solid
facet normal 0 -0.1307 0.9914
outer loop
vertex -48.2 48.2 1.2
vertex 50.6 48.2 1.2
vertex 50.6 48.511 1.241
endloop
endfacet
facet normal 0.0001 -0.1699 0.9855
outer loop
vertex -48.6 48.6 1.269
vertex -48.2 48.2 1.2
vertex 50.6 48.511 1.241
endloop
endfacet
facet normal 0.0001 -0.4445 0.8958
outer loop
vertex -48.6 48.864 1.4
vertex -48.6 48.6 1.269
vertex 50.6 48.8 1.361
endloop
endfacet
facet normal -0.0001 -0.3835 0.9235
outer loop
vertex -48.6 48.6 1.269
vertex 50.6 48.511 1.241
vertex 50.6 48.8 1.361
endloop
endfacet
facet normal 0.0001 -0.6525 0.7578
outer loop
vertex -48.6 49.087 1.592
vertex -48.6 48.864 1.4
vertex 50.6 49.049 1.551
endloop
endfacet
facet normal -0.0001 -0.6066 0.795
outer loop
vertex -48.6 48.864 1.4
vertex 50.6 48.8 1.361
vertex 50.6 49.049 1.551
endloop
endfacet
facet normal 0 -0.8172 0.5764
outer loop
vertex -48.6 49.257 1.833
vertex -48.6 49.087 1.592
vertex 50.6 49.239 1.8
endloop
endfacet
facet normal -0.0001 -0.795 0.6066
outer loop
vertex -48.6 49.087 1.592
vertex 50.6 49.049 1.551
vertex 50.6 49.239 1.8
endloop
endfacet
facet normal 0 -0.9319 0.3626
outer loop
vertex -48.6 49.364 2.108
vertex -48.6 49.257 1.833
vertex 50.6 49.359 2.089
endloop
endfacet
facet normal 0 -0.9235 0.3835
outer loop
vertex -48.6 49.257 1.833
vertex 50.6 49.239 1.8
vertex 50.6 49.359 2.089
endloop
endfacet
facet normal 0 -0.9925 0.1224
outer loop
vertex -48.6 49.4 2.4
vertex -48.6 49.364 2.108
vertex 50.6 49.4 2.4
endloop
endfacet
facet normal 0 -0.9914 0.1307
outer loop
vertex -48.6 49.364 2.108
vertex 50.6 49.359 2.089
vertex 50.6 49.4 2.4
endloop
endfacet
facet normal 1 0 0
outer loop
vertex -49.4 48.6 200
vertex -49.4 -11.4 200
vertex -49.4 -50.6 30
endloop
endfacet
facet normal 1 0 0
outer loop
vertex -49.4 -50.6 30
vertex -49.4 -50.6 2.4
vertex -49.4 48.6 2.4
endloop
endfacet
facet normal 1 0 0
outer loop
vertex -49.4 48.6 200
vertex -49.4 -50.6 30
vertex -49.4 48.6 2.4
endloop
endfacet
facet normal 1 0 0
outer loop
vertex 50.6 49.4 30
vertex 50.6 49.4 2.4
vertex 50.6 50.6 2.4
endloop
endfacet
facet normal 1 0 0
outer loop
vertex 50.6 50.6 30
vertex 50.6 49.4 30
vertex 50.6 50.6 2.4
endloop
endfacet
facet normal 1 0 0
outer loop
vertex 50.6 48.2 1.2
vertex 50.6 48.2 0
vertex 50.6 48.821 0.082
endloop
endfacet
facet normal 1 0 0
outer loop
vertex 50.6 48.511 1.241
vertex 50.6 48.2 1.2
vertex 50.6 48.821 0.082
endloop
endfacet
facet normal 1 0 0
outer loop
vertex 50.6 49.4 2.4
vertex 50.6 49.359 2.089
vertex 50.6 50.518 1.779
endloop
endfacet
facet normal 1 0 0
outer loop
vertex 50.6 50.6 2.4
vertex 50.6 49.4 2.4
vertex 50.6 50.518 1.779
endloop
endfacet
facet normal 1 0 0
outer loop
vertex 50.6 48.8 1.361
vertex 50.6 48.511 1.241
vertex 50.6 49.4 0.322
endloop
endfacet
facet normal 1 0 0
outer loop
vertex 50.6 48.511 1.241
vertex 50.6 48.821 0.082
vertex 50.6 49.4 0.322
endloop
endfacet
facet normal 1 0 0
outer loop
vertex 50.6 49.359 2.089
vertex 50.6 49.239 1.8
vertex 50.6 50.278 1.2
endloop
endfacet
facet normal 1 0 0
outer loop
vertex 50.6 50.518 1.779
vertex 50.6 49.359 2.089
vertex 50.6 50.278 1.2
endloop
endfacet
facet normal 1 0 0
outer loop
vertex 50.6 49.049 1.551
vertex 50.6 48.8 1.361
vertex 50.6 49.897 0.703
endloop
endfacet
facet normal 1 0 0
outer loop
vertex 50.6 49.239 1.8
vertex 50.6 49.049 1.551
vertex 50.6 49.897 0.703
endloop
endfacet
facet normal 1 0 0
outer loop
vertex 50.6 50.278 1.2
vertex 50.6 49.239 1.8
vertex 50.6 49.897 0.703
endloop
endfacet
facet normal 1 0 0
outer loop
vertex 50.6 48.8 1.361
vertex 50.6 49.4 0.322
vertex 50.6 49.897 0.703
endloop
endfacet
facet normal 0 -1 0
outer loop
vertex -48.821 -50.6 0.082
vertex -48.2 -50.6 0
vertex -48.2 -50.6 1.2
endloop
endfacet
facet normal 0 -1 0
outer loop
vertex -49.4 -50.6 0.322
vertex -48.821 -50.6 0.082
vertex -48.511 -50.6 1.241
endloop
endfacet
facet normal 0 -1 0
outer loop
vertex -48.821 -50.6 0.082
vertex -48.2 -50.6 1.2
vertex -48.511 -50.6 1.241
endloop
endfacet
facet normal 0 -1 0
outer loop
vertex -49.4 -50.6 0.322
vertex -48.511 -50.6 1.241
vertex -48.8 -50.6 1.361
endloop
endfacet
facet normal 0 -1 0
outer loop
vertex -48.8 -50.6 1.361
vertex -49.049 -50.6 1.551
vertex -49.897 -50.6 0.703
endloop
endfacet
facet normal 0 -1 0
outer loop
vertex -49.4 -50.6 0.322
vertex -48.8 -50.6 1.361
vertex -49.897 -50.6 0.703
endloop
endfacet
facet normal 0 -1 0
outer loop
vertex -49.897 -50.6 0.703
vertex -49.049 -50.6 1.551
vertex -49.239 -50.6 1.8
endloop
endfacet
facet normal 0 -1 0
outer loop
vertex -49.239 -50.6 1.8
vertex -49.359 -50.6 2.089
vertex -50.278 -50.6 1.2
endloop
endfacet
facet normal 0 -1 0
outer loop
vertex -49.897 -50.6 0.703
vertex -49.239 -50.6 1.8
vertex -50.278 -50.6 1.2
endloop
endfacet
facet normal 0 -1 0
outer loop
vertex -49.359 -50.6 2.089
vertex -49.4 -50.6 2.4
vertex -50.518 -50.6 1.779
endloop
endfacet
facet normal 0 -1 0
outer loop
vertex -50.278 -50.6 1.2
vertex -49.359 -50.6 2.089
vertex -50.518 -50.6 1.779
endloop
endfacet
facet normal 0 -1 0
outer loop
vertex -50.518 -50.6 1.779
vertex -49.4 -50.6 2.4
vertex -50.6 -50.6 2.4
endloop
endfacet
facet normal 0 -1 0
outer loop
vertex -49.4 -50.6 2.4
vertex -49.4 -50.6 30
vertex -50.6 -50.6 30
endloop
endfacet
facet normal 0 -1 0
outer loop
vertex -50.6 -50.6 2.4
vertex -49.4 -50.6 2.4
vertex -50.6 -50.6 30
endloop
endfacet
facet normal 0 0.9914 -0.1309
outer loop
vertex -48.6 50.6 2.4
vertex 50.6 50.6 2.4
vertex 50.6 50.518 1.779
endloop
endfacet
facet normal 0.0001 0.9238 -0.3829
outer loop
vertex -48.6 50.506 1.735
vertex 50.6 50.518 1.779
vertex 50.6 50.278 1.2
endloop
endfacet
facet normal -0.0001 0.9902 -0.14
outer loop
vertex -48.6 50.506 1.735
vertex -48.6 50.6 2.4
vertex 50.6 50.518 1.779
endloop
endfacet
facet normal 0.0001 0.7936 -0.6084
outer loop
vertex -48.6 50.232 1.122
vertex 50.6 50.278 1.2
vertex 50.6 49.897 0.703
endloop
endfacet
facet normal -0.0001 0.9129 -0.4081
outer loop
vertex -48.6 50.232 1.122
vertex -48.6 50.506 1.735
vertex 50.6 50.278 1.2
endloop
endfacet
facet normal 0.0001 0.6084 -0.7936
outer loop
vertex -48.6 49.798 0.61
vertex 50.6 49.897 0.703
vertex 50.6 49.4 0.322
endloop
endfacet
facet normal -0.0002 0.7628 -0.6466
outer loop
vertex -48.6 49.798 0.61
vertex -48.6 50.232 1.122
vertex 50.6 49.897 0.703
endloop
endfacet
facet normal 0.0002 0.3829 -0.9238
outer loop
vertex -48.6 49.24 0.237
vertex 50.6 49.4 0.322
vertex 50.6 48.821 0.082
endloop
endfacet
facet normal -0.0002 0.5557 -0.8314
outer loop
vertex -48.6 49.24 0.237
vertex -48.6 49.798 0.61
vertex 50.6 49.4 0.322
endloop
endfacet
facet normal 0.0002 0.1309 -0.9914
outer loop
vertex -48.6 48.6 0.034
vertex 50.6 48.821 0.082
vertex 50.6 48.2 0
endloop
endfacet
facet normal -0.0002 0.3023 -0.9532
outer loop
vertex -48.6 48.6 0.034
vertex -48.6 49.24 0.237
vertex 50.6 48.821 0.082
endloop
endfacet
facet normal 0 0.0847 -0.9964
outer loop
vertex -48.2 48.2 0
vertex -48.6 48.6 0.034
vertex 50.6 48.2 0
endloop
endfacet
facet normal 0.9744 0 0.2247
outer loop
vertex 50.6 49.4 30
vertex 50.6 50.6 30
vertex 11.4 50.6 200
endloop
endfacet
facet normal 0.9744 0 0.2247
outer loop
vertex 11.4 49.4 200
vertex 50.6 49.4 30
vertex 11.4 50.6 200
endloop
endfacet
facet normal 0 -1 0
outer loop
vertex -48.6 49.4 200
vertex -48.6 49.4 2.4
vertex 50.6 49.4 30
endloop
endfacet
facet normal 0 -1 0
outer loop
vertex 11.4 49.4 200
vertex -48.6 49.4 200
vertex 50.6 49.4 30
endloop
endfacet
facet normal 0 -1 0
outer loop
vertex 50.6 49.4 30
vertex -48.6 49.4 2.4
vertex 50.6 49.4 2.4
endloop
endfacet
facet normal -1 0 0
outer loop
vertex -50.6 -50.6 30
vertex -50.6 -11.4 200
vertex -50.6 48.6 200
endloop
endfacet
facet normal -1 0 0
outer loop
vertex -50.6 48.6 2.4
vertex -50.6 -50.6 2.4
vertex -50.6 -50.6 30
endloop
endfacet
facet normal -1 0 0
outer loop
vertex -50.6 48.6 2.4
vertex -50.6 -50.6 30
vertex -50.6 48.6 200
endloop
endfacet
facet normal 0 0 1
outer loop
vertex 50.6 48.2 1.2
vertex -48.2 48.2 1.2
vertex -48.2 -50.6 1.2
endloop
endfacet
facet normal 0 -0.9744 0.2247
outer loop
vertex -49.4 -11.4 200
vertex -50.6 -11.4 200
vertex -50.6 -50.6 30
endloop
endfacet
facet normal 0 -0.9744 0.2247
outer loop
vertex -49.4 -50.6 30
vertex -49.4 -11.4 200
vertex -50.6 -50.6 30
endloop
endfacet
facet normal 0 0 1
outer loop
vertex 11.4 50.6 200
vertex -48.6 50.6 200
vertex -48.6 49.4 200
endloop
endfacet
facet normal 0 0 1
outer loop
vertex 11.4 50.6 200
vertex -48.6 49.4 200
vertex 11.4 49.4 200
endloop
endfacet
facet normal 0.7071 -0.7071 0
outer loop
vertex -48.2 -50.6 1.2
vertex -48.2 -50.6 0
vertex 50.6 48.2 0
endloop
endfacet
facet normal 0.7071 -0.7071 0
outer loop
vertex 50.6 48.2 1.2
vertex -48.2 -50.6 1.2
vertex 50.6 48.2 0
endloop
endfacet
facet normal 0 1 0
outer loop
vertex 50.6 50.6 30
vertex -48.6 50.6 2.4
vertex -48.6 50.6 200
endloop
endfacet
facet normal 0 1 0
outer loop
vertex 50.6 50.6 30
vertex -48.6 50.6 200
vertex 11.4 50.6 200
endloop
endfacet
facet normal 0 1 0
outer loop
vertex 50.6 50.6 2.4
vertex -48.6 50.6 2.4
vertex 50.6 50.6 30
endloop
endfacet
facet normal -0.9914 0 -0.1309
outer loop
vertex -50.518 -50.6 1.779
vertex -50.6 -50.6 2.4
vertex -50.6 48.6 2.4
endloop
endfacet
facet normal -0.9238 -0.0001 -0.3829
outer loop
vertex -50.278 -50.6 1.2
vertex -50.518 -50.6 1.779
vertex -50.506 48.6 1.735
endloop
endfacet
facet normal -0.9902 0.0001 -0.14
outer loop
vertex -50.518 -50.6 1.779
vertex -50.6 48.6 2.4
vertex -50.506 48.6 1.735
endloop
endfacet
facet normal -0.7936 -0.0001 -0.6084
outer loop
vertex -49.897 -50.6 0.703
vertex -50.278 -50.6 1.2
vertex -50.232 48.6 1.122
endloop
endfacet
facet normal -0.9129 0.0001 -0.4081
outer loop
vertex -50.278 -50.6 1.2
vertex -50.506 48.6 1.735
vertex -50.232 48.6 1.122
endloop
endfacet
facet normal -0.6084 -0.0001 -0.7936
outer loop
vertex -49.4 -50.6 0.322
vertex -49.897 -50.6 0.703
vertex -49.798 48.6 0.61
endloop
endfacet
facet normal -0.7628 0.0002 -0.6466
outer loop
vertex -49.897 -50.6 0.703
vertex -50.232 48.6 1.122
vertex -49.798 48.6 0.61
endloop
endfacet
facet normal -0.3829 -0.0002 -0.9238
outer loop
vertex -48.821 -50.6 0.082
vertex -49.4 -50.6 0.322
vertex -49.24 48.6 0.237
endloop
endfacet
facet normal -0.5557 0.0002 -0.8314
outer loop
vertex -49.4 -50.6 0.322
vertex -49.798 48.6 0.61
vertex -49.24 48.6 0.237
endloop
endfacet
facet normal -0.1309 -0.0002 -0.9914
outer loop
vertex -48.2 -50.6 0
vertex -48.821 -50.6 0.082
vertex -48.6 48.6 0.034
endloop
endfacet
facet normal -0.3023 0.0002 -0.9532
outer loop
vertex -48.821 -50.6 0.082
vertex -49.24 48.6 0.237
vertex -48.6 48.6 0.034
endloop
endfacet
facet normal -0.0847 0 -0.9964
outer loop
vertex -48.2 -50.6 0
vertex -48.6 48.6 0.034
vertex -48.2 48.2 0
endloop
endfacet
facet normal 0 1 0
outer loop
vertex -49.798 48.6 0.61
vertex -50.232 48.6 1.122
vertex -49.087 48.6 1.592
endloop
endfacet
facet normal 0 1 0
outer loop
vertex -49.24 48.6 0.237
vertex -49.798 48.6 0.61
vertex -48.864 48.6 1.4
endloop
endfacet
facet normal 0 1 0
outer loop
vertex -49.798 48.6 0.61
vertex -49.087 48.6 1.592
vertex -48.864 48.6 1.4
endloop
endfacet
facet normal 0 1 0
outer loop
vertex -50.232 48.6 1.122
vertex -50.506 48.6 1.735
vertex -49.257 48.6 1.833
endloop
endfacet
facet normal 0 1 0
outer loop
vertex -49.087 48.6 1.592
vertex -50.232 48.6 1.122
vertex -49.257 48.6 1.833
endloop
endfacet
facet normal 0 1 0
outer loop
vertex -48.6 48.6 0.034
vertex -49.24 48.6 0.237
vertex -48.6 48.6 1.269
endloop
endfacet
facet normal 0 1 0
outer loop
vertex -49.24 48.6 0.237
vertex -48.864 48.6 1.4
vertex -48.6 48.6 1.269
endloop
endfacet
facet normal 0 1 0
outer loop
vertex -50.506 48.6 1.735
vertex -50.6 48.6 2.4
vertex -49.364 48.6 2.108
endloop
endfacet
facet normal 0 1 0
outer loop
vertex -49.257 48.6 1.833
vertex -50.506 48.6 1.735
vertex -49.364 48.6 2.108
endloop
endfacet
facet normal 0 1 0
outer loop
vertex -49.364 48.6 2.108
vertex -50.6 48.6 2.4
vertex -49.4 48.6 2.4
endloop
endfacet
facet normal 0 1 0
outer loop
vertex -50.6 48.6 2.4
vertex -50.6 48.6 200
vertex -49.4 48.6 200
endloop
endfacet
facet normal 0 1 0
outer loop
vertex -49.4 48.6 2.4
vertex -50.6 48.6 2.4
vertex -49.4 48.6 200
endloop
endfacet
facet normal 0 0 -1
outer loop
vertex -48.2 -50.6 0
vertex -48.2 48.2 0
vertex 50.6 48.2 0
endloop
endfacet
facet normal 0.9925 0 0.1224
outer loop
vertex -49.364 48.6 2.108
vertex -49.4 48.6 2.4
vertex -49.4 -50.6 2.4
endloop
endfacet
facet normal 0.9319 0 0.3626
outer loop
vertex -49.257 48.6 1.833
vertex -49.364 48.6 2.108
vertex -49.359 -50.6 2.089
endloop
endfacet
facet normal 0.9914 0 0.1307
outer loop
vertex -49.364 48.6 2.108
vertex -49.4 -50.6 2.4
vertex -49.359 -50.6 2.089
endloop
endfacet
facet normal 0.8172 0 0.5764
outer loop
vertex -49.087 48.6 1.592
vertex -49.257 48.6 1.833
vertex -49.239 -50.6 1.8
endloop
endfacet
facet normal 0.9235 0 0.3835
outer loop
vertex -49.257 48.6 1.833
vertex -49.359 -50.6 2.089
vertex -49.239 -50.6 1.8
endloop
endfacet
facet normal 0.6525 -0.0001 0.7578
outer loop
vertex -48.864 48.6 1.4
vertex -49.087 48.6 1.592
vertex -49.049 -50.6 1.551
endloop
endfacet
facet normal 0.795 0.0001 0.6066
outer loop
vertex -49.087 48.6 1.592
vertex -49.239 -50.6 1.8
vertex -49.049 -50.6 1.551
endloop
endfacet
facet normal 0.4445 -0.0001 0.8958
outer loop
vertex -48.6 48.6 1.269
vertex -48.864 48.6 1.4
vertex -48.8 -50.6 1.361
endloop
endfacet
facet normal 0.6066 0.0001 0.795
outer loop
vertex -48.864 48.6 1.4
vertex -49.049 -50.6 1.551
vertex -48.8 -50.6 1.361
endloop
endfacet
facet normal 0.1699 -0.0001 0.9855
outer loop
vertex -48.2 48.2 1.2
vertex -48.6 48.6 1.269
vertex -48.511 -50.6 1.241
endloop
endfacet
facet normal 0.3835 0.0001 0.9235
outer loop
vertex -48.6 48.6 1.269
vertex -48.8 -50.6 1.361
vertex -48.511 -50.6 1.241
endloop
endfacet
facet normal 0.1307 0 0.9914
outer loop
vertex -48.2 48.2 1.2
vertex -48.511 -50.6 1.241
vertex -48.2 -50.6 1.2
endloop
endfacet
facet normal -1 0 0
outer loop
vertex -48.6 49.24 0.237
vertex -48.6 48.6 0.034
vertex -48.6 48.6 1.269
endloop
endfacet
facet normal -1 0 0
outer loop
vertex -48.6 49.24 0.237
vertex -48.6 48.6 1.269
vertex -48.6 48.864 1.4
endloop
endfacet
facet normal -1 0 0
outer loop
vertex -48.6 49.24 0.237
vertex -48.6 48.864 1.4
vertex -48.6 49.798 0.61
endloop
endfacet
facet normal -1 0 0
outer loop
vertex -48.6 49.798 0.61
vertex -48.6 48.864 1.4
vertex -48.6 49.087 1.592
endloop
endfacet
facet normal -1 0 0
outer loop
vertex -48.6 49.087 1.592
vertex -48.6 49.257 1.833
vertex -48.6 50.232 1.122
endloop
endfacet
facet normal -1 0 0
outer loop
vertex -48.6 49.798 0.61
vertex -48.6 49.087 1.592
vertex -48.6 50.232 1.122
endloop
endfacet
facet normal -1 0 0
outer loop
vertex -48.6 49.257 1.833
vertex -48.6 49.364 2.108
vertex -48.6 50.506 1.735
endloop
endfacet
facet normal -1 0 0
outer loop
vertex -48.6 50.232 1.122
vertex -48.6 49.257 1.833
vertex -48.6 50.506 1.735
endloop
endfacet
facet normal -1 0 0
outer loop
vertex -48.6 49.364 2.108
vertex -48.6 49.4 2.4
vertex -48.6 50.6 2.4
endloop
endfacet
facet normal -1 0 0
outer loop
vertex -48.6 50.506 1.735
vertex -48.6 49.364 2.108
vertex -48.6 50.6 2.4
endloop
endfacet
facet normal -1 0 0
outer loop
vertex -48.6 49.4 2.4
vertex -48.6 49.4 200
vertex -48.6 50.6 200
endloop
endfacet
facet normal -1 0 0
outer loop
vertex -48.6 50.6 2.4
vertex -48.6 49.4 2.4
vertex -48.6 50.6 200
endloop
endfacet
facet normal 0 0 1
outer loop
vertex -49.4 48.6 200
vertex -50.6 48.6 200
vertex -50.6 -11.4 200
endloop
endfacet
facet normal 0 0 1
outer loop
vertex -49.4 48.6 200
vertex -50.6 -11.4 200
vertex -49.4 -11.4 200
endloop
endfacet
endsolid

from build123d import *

# Parameters (mm, degrees)
F0_W        = 101.2
F0_H        = 101.2
F1_DEPTH    = 200
F2_T        = -1.2
F4_W        = 0.8
F4_H        = 0.8
F5_DEPTH    = 200.001
F6_R        = 1.2
F7_T4_DEPTH = 101.8
F8_R        = 2.4
F9_T1_DEPTH = 110.8
F12_DEPTH   = 25
F13_DEPTH   = 25
F15_DEPTH   = 25


# Not quite as in the source:
# - a fillet or chamfer that OpenCascade refuses, or shapes differently, is made with other operations: its cross-section is extruded or revolved along the edge and cut away or added


with BuildPart() as f1:
    # F0 (on Top) → F1 (new body)
    with BuildSketch(Plane.XY):
        Rectangle(F0_W, F0_H)
    extrude(amount=F1_DEPTH)

    # F2
    f2_openings = [f1.faces().sort_by_distance(p)[0] for p in [
        (0, 0, 200),
        (0, -50.6, 100),
        (50.6, 0, 100),
    ]]
    offset(amount=F2_T, openings=f2_openings)

    # F4 (on face) → F5 (cut, through all)
    with BuildSketch(Plane.XY.offset(200)):
        with Locations((-49, 49)):
            Rectangle(F4_W, F4_H)
        Polygon((-50.6, 50.6), (-50.6, 48.6), (-49.4, 48.6), (-49.4, 49.4), (-48.6, 49.4), (-48.6, 50.6), align=None)
    extrude(amount=-F5_DEPTH, mode=Mode.SUBTRACT)

    # F6
    f6_edges = [f1.edges().sort_by_distance(p)[0] for p in [
        (1, 49.4, 1.2),
    ]]
    fillet(f6_edges, radius=F6_R)

    # F7: fillet of radius 1.2 on 1 edges, made by hand


with BuildPart() as f7_tool2:
    # F7_s3 → F7_t4 (new body)
    with BuildSketch(Plane.XZ.offset(50.6)):
        with BuildLine():
            ThreePointArc((-49.4, 2.4), (-49.0485281374, 1.5514718626), (-48.2, 1.2))
            Line((-48.2, 1.2), (-49.4, 1.2))
            Line((-49.4, 1.2), (-49.4, 2.4))
        make_face()
    extrude(amount=-F7_T4_DEPTH)

    split(bisect_by=Plane.XZ.offset(-48.6), keep=Keep.TOP)


with BuildPart() as f1_1:
    add(f1.part)

    # F7_t1: union F7_tool2
    add(f7_tool2.part)

    # F8
    f8_edges = [f1_1.edges().sort_by_distance(p)[0] for p in [
        (-50.6, -1, 0),
    ]]
    fillet(f8_edges, radius=F8_R)

    # F9: fillet of radius 2.4 on 1 edges, made by hand

    # F9_s2 → F9_t1 (cut)
    with BuildSketch(Plane.YZ.offset(-54.2)):
        with BuildLine():
            ThreePointArc((50.6, 2.4), (49.8970562748, 0.7029437252), (48.2, 0))
            Line((48.2, 0), (50.6, 0))
            Line((50.6, 0), (50.6, 2.4))
        make_face()
    extrude(amount=F9_T1_DEPTH, mode=Mode.SUBTRACT)

    # F11 (on face) → F12 (cut)
    with BuildSketch(Plane(origin=(0, 50.6, 0), x_dir=(-1, 0, 0), z_dir=(0, 1, 0))):
        Polygon((-11.4, 200), (-50.6, 200), (-50.6, 30), align=None)
    extrude(amount=-F12_DEPTH, mode=Mode.SUBTRACT)

    # F10 (on face) → F13 (cut)
    with BuildSketch(Plane(origin=(-50.6, 0, 0), x_dir=(0, -1, 0), z_dir=(-1, 0, 0))):
        Polygon((50.6, 30), (50.6, 200), (11.4, 200), align=None)
    extrude(amount=-F13_DEPTH, mode=Mode.SUBTRACT)

    # F14 (on face) → F15 (cut)
    with BuildSketch(Plane(origin=(0, 0, 0), x_dir=(1, 0, 0), z_dir=(0, 0, -1))):
        Polygon((50.6, -48.2), (50.6, 50.6), (-48.2, 50.6), align=None)
    extrude(amount=-F15_DEPTH, mode=Mode.SUBTRACT)


solid = f1_1.part
